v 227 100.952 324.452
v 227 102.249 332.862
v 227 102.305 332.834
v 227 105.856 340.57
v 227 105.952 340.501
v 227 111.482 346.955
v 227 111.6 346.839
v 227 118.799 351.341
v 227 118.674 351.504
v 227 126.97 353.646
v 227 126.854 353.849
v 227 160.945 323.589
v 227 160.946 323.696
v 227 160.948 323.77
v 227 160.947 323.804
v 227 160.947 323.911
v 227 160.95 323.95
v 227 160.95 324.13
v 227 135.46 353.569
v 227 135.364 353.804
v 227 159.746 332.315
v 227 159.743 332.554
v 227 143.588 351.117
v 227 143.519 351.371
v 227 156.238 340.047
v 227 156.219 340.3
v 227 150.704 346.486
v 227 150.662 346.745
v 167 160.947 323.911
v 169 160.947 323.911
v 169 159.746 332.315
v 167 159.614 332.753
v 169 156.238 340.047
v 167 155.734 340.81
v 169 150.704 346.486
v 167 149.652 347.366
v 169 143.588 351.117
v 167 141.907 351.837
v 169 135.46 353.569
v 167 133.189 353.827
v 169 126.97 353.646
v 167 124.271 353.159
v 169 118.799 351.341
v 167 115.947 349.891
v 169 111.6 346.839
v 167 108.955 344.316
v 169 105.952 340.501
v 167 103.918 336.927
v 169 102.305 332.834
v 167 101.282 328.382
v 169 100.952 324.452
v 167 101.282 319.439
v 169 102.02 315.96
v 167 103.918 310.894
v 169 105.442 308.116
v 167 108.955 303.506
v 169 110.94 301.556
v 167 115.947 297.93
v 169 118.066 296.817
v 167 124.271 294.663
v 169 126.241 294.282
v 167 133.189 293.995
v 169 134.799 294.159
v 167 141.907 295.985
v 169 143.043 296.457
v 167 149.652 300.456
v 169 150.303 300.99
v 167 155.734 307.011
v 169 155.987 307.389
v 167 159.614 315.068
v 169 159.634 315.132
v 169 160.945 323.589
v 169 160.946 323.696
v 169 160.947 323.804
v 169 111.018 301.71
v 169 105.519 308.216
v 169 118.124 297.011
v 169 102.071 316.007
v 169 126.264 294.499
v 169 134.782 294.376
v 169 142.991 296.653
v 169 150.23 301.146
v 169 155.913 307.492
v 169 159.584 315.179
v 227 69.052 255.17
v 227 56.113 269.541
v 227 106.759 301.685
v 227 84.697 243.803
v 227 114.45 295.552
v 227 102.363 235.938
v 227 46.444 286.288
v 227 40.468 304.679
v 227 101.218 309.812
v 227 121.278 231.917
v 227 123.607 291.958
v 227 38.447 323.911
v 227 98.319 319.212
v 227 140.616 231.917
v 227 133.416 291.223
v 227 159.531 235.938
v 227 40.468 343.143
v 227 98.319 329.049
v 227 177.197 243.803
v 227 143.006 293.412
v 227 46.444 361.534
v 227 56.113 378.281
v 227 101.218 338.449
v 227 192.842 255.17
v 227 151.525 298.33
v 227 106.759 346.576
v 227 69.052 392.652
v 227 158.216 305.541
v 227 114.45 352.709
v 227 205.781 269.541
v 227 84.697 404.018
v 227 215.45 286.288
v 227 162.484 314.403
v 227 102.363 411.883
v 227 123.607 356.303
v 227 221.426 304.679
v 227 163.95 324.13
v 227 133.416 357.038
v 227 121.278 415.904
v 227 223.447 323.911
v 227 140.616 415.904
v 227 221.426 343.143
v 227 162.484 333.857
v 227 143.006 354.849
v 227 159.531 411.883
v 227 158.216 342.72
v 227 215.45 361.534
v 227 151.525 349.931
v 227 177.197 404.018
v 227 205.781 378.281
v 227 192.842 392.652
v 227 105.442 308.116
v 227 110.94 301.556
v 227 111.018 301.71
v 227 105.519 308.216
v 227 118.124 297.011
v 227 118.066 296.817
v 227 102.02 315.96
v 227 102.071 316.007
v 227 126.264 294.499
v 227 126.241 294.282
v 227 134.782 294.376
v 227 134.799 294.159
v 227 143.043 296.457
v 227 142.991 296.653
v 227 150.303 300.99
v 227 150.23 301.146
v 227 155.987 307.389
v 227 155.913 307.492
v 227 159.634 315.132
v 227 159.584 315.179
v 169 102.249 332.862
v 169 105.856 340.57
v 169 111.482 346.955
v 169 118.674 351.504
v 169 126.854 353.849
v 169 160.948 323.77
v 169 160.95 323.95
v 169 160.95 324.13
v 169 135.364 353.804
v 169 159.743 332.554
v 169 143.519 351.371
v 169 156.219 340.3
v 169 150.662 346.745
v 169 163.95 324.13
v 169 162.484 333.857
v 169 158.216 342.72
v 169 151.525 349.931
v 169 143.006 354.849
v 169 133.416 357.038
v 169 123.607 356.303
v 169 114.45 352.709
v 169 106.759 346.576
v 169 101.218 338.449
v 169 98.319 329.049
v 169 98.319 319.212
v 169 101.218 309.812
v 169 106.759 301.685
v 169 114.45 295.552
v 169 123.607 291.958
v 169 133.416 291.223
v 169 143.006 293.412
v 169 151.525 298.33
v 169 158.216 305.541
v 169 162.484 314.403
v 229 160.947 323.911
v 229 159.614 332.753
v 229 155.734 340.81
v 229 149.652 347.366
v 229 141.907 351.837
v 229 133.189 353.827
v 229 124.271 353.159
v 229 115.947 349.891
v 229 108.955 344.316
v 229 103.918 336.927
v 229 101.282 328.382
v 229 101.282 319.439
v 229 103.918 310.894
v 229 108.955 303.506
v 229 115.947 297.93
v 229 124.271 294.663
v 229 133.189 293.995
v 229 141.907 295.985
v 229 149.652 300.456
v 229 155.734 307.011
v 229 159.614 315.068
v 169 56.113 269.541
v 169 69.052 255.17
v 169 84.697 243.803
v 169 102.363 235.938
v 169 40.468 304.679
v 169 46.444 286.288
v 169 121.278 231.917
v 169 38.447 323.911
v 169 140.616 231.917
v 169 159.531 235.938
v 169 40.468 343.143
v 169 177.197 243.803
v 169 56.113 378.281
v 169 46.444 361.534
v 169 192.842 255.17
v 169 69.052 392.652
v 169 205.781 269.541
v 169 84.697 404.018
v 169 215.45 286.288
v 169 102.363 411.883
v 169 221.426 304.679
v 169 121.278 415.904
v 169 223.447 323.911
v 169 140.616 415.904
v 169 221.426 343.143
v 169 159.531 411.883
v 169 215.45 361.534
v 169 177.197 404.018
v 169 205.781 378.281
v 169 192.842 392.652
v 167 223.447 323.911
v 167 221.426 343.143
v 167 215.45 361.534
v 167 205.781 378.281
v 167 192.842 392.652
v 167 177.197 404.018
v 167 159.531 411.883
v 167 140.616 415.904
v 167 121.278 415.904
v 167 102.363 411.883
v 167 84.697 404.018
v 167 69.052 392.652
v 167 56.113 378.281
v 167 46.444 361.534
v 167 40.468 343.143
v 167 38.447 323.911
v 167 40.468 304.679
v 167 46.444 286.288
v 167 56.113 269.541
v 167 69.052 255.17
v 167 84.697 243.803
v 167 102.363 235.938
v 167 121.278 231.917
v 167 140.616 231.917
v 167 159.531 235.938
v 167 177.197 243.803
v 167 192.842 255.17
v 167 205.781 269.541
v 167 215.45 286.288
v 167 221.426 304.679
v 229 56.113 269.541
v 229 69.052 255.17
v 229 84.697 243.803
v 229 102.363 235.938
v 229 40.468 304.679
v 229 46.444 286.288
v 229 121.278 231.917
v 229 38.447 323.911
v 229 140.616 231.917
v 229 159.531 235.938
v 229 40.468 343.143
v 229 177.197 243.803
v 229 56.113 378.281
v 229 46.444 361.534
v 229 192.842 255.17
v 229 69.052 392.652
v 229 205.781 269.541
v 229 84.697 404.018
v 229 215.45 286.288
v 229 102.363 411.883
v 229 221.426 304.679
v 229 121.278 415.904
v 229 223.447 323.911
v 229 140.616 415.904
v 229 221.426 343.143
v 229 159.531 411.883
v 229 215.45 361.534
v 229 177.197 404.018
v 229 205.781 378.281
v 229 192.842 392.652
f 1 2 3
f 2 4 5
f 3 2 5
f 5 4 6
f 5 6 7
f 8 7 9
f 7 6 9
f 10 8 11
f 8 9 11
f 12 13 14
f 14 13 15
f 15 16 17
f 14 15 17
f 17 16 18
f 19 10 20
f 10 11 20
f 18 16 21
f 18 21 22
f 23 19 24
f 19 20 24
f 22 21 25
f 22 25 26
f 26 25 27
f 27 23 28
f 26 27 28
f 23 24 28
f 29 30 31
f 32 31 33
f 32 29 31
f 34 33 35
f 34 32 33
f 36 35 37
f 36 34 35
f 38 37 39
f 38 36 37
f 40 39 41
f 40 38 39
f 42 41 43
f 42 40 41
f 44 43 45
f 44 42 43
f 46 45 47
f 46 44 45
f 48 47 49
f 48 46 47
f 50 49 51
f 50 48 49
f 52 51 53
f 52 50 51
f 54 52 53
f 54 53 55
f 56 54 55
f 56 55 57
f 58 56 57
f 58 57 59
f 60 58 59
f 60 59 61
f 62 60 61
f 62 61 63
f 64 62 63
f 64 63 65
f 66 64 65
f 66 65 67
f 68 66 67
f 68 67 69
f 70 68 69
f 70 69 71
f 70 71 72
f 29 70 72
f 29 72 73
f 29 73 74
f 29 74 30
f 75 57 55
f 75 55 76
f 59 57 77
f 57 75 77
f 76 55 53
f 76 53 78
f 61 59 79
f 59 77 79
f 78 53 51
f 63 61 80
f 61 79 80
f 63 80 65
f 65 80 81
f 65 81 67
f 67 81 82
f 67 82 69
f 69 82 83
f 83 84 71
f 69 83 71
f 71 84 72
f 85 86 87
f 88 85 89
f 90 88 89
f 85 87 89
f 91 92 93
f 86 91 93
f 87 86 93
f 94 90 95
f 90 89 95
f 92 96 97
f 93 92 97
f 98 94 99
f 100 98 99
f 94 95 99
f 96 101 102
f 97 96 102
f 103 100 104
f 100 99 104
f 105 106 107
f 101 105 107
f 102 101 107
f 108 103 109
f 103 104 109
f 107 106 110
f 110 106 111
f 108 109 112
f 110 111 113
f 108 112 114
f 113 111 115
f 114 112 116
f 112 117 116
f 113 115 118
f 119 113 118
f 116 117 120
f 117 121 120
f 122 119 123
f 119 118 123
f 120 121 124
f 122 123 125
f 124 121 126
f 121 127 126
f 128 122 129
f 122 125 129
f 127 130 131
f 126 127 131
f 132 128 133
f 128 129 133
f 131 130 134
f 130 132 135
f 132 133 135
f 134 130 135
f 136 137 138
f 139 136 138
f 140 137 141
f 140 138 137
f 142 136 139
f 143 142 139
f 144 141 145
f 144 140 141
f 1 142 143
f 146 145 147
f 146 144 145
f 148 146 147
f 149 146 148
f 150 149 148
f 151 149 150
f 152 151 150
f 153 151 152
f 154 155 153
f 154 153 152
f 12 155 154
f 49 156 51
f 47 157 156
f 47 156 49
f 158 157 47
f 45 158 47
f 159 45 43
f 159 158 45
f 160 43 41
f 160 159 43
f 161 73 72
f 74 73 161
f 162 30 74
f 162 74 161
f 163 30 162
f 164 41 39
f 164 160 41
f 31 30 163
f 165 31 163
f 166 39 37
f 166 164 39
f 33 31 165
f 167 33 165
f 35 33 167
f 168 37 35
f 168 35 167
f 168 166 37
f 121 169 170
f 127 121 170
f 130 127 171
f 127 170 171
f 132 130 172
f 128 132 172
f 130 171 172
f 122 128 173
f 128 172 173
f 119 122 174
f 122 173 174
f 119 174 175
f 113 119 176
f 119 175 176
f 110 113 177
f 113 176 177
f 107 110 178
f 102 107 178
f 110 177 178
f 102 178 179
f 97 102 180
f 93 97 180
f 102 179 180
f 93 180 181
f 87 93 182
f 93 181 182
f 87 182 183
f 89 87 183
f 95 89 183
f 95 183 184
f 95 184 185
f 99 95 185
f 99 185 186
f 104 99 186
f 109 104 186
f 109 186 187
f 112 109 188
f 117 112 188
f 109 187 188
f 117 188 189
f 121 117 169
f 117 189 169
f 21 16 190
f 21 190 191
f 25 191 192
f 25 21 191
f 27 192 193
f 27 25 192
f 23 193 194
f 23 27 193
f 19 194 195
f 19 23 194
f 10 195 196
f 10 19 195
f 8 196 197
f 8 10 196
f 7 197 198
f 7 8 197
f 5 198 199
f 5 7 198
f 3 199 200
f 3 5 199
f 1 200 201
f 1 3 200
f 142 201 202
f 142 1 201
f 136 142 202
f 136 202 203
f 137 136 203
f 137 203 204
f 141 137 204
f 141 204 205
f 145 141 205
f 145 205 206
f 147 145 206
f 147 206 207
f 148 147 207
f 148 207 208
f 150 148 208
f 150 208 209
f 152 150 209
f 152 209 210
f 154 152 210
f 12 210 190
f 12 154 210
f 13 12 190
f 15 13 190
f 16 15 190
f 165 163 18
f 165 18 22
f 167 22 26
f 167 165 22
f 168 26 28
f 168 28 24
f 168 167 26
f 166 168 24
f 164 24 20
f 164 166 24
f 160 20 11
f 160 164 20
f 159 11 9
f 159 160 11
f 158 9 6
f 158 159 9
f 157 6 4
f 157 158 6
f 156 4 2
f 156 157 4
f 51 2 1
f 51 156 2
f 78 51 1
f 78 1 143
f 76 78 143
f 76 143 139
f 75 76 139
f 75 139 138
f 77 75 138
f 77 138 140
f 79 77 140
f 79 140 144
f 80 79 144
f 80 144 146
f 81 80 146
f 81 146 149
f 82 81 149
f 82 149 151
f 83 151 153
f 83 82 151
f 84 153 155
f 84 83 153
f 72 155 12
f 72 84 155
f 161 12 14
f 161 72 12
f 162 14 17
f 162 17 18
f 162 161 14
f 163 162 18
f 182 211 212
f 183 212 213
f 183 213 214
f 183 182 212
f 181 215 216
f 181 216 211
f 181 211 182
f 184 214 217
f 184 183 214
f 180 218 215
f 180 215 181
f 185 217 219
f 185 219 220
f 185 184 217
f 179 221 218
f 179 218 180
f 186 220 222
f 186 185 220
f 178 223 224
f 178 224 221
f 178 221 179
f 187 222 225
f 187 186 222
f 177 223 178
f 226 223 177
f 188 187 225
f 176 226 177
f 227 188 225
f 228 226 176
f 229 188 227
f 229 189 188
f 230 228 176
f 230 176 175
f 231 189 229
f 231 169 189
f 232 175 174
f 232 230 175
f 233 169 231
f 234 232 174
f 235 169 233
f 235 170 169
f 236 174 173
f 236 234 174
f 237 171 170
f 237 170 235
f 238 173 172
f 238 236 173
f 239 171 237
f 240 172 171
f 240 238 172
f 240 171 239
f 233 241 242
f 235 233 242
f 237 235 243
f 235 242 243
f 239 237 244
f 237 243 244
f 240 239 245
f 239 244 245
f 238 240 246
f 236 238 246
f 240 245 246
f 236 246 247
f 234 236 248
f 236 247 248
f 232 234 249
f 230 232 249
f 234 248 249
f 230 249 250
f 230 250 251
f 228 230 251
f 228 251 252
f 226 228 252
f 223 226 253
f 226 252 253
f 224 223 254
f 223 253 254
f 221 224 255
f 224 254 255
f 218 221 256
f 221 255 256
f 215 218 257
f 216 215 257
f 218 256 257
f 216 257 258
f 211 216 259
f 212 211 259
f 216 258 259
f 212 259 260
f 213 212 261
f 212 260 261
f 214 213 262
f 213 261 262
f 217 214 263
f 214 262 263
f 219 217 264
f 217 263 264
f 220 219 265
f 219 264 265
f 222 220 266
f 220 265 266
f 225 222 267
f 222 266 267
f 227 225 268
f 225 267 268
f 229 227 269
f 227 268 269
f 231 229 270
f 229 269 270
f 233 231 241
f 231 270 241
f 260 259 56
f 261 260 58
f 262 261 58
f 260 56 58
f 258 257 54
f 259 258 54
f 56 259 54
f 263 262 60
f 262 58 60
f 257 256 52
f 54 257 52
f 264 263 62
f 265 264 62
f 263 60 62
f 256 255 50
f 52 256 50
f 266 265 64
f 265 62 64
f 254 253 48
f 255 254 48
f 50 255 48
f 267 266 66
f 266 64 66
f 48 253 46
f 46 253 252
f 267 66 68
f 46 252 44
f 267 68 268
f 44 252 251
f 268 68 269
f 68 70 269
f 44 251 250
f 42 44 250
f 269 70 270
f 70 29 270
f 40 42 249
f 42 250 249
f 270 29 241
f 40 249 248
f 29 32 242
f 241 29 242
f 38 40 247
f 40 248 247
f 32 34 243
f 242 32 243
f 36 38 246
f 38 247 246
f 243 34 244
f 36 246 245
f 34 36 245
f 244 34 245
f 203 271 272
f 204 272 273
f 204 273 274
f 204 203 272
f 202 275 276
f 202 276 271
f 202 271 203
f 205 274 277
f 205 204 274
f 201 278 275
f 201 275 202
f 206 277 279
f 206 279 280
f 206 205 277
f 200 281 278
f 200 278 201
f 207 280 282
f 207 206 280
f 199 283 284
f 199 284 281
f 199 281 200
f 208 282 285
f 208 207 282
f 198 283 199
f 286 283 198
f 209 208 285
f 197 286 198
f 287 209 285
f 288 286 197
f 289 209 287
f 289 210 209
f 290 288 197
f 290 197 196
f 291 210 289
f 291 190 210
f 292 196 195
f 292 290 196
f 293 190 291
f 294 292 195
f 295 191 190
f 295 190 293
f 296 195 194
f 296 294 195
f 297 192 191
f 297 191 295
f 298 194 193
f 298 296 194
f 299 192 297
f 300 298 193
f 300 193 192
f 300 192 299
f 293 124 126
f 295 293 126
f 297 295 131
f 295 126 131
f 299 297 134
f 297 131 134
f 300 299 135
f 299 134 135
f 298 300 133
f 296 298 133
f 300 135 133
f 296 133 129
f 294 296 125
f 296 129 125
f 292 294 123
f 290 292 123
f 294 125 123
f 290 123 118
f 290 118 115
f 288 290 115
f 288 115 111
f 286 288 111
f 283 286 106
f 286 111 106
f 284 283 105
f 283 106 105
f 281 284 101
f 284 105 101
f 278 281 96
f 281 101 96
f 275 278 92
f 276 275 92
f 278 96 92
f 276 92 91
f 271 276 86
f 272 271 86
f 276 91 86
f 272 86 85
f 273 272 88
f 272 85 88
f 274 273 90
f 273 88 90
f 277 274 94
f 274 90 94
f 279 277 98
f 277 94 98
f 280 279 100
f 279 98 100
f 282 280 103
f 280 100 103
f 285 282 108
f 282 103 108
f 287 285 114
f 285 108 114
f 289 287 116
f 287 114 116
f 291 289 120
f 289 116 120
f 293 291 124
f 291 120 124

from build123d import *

# Parameters (mm, degrees)
SKETCH013_R   = 92.5
SKETCH013_R_2 = 30
PAD013_DEPTH  = 2
SKETCH014_R   = 33
SKETCH014_R_2 = 30
PAD014_DEPTH  = 58
SKETCH012_R   = 92.5
SKETCH012_R_2 = 30
PAD012_DEPTH  = 2


with BuildPart() as pad013:
    # Sketch013 → Pad013 (new body)
    with BuildSketch(Plane.YZ.offset(60)):
        with Locations((138.947021, 143.910721)):
            Circle(SKETCH013_R)
        with Locations((138.947021, 143.910721)):
            Circle(SKETCH013_R_2, mode=Mode.SUBTRACT)
    extrude(amount=PAD013_DEPTH)


with BuildPart() as pad014:
    # Sketch014 → Pad014 (new body)
    with BuildSketch(Plane.YZ.offset(2)):
        with Locations((138.95018, 144.130356)):
            Circle(SKETCH014_R)
        with Locations((138.95018, 144.130356)):
            Circle(SKETCH014_R_2, mode=Mode.SUBTRACT)
    extrude(amount=PAD014_DEPTH)


with BuildPart() as plasticrole:
    # Sketch012 → Pad012 (new body)
    with BuildSketch(Plane.YZ):
        with Locations((138.947021, 143.910721)):
            Circle(SKETCH012_R)
        with Locations((138.947021, 143.910721)):
            Circle(SKETCH012_R_2, mode=Mode.SUBTRACT)
    extrude(amount=PAD012_DEPTH)

    # Fusion014: union Pad013, Pad014
    add(pad013.part)
    add(pad014.part)


with BuildPart() as plasticrole_1:
    # Fusion014 placement: moved
    add(plasticrole.part.moved(Location((167, -8, 180))))


solid = plasticrole_1.part
